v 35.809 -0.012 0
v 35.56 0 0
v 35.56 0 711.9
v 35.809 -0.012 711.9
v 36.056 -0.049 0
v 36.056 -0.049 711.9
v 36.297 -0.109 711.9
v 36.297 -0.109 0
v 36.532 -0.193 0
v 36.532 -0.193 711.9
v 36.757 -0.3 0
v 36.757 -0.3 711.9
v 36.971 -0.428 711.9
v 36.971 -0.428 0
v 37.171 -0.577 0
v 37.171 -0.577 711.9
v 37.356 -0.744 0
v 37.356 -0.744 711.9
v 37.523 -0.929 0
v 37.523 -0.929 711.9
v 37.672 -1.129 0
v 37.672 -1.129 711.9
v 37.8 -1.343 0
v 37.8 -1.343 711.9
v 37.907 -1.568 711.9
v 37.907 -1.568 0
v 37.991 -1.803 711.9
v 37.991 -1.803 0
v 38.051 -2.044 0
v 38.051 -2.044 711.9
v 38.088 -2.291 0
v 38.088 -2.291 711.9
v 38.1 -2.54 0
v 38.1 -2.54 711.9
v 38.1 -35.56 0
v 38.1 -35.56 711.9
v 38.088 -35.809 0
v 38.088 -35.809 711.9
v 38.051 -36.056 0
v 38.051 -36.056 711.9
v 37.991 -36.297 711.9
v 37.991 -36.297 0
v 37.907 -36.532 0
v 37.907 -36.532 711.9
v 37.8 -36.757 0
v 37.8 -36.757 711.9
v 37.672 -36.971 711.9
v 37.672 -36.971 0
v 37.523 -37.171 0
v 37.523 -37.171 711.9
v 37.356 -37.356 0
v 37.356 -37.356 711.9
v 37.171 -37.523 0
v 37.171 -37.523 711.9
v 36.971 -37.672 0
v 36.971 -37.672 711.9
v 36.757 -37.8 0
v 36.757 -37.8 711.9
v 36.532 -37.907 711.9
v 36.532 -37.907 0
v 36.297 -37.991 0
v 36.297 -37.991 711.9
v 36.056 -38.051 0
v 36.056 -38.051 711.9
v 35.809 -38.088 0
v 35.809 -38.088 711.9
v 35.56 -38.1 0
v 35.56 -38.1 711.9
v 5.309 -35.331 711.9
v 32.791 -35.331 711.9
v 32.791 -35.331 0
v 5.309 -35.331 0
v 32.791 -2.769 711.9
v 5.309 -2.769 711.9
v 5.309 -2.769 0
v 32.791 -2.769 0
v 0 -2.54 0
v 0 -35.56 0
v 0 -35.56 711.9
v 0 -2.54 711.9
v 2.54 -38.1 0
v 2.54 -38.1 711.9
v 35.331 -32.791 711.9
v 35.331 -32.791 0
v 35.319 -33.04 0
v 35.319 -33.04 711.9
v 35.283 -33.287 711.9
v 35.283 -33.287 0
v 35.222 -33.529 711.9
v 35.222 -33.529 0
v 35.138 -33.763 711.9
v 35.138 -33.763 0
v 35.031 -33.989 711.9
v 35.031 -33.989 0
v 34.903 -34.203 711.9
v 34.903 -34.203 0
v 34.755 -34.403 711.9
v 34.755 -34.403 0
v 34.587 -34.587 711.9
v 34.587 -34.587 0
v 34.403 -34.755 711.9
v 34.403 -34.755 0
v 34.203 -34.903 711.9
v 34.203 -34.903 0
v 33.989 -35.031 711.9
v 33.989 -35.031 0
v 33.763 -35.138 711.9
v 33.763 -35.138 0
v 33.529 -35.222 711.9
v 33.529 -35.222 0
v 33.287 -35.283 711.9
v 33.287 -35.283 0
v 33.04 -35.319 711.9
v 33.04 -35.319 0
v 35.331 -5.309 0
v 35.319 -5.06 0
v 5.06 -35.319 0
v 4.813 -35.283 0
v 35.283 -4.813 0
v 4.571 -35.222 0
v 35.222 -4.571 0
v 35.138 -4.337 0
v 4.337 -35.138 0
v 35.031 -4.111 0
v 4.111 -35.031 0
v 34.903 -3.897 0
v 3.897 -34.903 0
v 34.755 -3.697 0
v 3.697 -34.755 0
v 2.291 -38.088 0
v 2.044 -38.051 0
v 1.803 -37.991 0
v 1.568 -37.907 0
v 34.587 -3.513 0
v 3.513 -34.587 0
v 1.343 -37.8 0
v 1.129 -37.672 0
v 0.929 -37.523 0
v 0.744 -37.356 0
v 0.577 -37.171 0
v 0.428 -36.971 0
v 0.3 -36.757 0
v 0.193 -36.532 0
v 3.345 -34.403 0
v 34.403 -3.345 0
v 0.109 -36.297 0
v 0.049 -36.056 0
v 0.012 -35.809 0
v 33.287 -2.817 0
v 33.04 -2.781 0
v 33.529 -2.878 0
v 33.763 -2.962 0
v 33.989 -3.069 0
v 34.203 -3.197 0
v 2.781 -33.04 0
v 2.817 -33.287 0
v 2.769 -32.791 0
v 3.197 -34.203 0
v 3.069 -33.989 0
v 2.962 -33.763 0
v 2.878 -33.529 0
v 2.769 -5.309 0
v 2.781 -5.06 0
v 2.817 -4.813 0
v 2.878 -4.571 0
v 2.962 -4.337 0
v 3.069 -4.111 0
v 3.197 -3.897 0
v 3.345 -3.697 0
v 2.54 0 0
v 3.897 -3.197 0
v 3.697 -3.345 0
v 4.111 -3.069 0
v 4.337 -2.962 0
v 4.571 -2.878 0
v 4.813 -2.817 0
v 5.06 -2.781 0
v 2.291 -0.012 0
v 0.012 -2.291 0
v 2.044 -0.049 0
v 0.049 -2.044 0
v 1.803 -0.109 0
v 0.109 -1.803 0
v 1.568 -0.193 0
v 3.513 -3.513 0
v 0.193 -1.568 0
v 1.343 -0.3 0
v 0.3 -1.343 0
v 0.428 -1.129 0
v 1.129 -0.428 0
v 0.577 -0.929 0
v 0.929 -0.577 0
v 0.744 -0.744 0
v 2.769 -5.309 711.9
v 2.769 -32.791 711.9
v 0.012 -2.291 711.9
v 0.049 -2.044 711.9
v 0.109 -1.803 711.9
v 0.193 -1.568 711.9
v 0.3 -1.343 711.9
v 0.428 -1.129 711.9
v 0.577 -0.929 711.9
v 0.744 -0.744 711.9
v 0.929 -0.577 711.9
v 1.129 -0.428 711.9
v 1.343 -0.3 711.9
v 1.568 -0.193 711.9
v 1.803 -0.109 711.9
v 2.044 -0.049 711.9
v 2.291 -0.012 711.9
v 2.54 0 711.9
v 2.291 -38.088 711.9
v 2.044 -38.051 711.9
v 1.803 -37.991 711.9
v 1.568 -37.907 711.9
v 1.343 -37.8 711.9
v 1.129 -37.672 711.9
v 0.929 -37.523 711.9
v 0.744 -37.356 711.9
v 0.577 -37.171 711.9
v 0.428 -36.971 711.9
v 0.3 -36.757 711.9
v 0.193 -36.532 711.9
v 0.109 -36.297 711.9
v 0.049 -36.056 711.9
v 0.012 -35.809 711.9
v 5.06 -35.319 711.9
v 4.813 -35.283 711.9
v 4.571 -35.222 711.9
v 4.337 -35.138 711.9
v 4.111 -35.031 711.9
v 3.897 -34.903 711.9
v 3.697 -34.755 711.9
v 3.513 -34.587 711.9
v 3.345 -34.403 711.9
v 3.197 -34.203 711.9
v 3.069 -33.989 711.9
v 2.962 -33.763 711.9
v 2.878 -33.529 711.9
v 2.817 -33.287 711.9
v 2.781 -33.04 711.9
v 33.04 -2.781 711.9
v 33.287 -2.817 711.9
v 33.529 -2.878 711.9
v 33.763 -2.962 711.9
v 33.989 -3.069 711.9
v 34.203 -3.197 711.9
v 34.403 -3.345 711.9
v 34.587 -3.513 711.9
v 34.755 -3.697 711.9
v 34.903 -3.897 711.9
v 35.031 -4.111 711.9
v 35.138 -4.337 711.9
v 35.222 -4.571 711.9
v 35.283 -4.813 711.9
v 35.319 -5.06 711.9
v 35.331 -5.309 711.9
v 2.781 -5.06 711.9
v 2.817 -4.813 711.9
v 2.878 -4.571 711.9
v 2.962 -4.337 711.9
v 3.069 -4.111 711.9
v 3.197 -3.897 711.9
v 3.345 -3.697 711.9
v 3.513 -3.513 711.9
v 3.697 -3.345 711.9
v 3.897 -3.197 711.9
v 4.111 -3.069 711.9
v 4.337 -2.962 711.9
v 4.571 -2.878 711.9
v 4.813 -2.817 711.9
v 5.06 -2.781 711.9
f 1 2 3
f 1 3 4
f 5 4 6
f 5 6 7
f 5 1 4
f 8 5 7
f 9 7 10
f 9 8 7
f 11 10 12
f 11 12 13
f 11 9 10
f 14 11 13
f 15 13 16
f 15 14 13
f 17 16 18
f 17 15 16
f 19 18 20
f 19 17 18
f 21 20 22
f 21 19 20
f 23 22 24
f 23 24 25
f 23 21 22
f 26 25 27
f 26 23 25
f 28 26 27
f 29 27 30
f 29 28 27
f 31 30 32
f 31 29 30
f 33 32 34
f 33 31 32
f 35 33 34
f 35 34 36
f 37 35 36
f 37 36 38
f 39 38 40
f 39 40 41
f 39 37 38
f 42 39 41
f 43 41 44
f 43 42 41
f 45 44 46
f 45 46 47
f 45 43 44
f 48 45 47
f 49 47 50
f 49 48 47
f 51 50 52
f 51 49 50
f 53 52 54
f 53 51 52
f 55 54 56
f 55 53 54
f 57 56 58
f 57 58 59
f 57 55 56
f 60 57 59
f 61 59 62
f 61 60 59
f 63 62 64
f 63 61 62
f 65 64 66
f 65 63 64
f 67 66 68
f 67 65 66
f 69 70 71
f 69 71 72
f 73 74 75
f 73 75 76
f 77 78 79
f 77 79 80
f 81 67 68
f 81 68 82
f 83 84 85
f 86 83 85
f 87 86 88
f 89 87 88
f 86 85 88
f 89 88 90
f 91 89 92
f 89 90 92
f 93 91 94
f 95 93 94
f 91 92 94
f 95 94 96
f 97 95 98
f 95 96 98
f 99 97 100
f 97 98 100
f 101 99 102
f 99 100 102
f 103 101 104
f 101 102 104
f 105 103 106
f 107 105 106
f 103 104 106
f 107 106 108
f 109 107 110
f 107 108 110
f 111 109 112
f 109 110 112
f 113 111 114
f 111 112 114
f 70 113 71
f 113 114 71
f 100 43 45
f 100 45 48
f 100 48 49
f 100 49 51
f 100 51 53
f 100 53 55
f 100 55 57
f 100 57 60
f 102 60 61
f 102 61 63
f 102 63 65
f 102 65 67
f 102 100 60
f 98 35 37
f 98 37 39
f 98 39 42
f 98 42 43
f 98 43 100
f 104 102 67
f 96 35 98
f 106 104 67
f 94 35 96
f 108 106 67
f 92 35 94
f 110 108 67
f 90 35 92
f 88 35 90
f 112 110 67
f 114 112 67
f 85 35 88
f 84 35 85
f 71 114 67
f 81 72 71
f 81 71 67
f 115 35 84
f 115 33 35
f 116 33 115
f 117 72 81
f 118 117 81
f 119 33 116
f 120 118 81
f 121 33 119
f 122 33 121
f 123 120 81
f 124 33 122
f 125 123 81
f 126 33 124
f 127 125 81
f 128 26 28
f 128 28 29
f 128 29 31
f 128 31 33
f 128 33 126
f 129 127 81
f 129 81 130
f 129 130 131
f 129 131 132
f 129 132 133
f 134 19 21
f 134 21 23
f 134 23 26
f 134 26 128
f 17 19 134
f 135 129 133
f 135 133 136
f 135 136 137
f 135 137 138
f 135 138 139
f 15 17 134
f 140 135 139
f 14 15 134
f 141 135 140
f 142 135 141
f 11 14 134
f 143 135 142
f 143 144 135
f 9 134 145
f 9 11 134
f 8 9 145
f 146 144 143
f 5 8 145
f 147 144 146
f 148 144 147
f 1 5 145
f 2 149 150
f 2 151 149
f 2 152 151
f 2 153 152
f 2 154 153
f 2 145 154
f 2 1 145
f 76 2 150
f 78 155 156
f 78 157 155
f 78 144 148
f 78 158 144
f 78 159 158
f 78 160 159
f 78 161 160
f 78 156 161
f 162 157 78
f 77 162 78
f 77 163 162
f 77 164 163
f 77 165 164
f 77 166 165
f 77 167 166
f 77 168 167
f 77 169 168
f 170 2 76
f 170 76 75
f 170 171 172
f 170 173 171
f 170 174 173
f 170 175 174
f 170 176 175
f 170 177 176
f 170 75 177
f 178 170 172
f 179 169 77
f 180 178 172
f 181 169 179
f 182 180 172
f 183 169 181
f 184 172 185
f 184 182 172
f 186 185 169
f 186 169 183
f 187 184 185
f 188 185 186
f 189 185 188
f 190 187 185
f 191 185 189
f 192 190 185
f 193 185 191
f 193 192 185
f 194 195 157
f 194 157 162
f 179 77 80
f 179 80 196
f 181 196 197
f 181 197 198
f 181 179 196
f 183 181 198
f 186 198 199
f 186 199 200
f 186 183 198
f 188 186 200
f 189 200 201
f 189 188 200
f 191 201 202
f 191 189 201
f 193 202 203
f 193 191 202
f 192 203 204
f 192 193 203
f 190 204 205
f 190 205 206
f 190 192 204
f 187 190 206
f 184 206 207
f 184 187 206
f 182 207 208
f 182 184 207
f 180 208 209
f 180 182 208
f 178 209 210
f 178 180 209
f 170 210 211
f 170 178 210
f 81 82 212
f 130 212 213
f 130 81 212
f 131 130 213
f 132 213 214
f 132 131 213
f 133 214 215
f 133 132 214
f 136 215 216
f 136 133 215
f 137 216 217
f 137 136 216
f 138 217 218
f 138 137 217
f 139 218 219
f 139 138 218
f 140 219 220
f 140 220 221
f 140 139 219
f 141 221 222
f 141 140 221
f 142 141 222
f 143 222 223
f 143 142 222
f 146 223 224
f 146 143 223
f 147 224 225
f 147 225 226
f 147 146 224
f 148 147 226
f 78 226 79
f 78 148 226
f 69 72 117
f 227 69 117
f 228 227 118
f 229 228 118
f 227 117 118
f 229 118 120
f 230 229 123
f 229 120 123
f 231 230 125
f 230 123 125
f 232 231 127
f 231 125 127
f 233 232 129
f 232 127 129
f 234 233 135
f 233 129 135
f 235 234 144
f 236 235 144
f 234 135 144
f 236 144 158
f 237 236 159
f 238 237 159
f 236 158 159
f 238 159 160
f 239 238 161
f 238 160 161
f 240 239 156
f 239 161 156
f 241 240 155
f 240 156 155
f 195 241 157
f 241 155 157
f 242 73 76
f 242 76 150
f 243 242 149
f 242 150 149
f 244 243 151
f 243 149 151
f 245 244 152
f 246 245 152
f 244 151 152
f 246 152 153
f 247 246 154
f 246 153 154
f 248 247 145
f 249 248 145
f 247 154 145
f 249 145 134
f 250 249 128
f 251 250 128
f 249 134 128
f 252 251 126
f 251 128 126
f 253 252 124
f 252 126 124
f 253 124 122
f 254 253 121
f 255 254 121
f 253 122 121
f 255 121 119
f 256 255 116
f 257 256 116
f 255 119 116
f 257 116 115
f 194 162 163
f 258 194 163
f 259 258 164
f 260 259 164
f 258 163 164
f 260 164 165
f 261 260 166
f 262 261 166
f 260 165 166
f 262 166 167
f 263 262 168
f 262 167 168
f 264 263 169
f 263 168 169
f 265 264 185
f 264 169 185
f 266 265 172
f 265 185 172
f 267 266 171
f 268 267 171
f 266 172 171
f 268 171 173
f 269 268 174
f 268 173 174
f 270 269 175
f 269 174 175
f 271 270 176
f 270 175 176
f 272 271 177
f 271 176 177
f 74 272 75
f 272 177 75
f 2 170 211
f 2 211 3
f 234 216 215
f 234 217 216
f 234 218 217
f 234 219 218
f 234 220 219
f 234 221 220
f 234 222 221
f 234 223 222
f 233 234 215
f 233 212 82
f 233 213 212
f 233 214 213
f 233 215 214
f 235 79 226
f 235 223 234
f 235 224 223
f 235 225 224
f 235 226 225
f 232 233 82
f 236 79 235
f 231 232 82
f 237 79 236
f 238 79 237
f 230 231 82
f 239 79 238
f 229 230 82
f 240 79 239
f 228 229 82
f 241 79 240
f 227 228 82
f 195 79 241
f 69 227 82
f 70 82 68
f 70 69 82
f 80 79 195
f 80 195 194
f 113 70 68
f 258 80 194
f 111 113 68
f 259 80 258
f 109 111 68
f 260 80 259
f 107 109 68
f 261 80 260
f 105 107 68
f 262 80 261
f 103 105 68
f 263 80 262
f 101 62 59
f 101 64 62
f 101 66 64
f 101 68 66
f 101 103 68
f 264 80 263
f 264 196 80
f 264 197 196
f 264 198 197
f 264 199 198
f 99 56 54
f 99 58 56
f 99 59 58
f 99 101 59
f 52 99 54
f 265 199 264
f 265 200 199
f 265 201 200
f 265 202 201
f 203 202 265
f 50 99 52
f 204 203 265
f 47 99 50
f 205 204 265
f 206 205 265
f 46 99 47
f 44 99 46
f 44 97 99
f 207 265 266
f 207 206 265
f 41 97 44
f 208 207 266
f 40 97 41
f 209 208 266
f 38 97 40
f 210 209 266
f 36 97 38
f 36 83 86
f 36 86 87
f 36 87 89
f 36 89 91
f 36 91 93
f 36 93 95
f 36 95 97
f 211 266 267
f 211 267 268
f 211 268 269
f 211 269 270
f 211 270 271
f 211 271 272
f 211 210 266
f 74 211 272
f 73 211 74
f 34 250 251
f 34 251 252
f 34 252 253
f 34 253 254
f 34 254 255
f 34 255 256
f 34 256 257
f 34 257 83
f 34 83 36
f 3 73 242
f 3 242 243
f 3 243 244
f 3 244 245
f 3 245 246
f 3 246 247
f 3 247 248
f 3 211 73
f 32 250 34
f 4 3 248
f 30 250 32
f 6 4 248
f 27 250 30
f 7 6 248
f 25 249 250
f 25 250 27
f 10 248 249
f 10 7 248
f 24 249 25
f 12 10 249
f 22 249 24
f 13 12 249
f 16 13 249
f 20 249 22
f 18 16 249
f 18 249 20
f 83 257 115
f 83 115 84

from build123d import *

# Parameters (mm, degrees)
BOSS_EXTRUDE1_DEPTH = 737
SKETCH2_W           = 38.1
SKETCH2_H           = 25.1
CUT_EXTRUDE1_DEPTH  = 739.966995203


with BuildPart() as part:
    # Sketch1 → Boss-Extrude1 (new body)
    with BuildSketch(Plane.XY):
        with BuildLine():
            Line((2.54, 0), (35.56, 0))
            ThreePointArc((35.56, 0), (37.356051224, -0.743948776), (38.1, -2.54))
            Line((38.1, -2.54), (38.1, -35.56))
            ThreePointArc((38.1, -35.56), (37.356051224, -37.356051224), (35.56, -38.1))
            Line((35.56, -38.1), (2.54, -38.1))
            ThreePointArc((2.54, -38.1), (0.743948776, -37.356051224), (0, -35.56))
            Line((0, -35.56), (0, -2.54))
            ThreePointArc((0, -2.54), (0.743948776, -0.743948776), (2.54, 0))
        make_face()
        with BuildLine():
            Line((5.3086, -2.7686), (32.7914, -2.7686))
            ThreePointArc((32.7914, -2.7686), (34.587451224, -3.512548776), (35.3314, -5.3086))
            Line((35.3314, -5.3086), (35.3314, -32.7914))
            ThreePointArc((35.3314, -32.7914), (34.587451224, -34.587451224), (32.7914, -35.3314))
            Line((32.7914, -35.3314), (5.3086, -35.3314))
            ThreePointArc((5.3086, -35.3314), (3.512548776, -34.587451224), (2.7686, -32.7914))
            Line((2.7686, -32.7914), (2.7686, -5.3086))
            ThreePointArc((2.7686, -5.3086), (3.512548776, -3.512548776), (5.3086, -2.7686))
        make_face(mode=Mode.SUBTRACT)
    extrude(amount=BOSS_EXTRUDE1_DEPTH)

    # Sketch2 → Cut-Extrude1 (cut, through all)
    with BuildSketch(Plane(origin=(0, 0, 0), x_dir=(1, 0, 0), z_dir=(0, 1, 0))):
        with Locations((19.05, -724.45)):
            Rectangle(SKETCH2_W, SKETCH2_H)
    extrude(amount=-CUT_EXTRUDE1_DEPTH, mode=Mode.SUBTRACT)


solid = part.part
